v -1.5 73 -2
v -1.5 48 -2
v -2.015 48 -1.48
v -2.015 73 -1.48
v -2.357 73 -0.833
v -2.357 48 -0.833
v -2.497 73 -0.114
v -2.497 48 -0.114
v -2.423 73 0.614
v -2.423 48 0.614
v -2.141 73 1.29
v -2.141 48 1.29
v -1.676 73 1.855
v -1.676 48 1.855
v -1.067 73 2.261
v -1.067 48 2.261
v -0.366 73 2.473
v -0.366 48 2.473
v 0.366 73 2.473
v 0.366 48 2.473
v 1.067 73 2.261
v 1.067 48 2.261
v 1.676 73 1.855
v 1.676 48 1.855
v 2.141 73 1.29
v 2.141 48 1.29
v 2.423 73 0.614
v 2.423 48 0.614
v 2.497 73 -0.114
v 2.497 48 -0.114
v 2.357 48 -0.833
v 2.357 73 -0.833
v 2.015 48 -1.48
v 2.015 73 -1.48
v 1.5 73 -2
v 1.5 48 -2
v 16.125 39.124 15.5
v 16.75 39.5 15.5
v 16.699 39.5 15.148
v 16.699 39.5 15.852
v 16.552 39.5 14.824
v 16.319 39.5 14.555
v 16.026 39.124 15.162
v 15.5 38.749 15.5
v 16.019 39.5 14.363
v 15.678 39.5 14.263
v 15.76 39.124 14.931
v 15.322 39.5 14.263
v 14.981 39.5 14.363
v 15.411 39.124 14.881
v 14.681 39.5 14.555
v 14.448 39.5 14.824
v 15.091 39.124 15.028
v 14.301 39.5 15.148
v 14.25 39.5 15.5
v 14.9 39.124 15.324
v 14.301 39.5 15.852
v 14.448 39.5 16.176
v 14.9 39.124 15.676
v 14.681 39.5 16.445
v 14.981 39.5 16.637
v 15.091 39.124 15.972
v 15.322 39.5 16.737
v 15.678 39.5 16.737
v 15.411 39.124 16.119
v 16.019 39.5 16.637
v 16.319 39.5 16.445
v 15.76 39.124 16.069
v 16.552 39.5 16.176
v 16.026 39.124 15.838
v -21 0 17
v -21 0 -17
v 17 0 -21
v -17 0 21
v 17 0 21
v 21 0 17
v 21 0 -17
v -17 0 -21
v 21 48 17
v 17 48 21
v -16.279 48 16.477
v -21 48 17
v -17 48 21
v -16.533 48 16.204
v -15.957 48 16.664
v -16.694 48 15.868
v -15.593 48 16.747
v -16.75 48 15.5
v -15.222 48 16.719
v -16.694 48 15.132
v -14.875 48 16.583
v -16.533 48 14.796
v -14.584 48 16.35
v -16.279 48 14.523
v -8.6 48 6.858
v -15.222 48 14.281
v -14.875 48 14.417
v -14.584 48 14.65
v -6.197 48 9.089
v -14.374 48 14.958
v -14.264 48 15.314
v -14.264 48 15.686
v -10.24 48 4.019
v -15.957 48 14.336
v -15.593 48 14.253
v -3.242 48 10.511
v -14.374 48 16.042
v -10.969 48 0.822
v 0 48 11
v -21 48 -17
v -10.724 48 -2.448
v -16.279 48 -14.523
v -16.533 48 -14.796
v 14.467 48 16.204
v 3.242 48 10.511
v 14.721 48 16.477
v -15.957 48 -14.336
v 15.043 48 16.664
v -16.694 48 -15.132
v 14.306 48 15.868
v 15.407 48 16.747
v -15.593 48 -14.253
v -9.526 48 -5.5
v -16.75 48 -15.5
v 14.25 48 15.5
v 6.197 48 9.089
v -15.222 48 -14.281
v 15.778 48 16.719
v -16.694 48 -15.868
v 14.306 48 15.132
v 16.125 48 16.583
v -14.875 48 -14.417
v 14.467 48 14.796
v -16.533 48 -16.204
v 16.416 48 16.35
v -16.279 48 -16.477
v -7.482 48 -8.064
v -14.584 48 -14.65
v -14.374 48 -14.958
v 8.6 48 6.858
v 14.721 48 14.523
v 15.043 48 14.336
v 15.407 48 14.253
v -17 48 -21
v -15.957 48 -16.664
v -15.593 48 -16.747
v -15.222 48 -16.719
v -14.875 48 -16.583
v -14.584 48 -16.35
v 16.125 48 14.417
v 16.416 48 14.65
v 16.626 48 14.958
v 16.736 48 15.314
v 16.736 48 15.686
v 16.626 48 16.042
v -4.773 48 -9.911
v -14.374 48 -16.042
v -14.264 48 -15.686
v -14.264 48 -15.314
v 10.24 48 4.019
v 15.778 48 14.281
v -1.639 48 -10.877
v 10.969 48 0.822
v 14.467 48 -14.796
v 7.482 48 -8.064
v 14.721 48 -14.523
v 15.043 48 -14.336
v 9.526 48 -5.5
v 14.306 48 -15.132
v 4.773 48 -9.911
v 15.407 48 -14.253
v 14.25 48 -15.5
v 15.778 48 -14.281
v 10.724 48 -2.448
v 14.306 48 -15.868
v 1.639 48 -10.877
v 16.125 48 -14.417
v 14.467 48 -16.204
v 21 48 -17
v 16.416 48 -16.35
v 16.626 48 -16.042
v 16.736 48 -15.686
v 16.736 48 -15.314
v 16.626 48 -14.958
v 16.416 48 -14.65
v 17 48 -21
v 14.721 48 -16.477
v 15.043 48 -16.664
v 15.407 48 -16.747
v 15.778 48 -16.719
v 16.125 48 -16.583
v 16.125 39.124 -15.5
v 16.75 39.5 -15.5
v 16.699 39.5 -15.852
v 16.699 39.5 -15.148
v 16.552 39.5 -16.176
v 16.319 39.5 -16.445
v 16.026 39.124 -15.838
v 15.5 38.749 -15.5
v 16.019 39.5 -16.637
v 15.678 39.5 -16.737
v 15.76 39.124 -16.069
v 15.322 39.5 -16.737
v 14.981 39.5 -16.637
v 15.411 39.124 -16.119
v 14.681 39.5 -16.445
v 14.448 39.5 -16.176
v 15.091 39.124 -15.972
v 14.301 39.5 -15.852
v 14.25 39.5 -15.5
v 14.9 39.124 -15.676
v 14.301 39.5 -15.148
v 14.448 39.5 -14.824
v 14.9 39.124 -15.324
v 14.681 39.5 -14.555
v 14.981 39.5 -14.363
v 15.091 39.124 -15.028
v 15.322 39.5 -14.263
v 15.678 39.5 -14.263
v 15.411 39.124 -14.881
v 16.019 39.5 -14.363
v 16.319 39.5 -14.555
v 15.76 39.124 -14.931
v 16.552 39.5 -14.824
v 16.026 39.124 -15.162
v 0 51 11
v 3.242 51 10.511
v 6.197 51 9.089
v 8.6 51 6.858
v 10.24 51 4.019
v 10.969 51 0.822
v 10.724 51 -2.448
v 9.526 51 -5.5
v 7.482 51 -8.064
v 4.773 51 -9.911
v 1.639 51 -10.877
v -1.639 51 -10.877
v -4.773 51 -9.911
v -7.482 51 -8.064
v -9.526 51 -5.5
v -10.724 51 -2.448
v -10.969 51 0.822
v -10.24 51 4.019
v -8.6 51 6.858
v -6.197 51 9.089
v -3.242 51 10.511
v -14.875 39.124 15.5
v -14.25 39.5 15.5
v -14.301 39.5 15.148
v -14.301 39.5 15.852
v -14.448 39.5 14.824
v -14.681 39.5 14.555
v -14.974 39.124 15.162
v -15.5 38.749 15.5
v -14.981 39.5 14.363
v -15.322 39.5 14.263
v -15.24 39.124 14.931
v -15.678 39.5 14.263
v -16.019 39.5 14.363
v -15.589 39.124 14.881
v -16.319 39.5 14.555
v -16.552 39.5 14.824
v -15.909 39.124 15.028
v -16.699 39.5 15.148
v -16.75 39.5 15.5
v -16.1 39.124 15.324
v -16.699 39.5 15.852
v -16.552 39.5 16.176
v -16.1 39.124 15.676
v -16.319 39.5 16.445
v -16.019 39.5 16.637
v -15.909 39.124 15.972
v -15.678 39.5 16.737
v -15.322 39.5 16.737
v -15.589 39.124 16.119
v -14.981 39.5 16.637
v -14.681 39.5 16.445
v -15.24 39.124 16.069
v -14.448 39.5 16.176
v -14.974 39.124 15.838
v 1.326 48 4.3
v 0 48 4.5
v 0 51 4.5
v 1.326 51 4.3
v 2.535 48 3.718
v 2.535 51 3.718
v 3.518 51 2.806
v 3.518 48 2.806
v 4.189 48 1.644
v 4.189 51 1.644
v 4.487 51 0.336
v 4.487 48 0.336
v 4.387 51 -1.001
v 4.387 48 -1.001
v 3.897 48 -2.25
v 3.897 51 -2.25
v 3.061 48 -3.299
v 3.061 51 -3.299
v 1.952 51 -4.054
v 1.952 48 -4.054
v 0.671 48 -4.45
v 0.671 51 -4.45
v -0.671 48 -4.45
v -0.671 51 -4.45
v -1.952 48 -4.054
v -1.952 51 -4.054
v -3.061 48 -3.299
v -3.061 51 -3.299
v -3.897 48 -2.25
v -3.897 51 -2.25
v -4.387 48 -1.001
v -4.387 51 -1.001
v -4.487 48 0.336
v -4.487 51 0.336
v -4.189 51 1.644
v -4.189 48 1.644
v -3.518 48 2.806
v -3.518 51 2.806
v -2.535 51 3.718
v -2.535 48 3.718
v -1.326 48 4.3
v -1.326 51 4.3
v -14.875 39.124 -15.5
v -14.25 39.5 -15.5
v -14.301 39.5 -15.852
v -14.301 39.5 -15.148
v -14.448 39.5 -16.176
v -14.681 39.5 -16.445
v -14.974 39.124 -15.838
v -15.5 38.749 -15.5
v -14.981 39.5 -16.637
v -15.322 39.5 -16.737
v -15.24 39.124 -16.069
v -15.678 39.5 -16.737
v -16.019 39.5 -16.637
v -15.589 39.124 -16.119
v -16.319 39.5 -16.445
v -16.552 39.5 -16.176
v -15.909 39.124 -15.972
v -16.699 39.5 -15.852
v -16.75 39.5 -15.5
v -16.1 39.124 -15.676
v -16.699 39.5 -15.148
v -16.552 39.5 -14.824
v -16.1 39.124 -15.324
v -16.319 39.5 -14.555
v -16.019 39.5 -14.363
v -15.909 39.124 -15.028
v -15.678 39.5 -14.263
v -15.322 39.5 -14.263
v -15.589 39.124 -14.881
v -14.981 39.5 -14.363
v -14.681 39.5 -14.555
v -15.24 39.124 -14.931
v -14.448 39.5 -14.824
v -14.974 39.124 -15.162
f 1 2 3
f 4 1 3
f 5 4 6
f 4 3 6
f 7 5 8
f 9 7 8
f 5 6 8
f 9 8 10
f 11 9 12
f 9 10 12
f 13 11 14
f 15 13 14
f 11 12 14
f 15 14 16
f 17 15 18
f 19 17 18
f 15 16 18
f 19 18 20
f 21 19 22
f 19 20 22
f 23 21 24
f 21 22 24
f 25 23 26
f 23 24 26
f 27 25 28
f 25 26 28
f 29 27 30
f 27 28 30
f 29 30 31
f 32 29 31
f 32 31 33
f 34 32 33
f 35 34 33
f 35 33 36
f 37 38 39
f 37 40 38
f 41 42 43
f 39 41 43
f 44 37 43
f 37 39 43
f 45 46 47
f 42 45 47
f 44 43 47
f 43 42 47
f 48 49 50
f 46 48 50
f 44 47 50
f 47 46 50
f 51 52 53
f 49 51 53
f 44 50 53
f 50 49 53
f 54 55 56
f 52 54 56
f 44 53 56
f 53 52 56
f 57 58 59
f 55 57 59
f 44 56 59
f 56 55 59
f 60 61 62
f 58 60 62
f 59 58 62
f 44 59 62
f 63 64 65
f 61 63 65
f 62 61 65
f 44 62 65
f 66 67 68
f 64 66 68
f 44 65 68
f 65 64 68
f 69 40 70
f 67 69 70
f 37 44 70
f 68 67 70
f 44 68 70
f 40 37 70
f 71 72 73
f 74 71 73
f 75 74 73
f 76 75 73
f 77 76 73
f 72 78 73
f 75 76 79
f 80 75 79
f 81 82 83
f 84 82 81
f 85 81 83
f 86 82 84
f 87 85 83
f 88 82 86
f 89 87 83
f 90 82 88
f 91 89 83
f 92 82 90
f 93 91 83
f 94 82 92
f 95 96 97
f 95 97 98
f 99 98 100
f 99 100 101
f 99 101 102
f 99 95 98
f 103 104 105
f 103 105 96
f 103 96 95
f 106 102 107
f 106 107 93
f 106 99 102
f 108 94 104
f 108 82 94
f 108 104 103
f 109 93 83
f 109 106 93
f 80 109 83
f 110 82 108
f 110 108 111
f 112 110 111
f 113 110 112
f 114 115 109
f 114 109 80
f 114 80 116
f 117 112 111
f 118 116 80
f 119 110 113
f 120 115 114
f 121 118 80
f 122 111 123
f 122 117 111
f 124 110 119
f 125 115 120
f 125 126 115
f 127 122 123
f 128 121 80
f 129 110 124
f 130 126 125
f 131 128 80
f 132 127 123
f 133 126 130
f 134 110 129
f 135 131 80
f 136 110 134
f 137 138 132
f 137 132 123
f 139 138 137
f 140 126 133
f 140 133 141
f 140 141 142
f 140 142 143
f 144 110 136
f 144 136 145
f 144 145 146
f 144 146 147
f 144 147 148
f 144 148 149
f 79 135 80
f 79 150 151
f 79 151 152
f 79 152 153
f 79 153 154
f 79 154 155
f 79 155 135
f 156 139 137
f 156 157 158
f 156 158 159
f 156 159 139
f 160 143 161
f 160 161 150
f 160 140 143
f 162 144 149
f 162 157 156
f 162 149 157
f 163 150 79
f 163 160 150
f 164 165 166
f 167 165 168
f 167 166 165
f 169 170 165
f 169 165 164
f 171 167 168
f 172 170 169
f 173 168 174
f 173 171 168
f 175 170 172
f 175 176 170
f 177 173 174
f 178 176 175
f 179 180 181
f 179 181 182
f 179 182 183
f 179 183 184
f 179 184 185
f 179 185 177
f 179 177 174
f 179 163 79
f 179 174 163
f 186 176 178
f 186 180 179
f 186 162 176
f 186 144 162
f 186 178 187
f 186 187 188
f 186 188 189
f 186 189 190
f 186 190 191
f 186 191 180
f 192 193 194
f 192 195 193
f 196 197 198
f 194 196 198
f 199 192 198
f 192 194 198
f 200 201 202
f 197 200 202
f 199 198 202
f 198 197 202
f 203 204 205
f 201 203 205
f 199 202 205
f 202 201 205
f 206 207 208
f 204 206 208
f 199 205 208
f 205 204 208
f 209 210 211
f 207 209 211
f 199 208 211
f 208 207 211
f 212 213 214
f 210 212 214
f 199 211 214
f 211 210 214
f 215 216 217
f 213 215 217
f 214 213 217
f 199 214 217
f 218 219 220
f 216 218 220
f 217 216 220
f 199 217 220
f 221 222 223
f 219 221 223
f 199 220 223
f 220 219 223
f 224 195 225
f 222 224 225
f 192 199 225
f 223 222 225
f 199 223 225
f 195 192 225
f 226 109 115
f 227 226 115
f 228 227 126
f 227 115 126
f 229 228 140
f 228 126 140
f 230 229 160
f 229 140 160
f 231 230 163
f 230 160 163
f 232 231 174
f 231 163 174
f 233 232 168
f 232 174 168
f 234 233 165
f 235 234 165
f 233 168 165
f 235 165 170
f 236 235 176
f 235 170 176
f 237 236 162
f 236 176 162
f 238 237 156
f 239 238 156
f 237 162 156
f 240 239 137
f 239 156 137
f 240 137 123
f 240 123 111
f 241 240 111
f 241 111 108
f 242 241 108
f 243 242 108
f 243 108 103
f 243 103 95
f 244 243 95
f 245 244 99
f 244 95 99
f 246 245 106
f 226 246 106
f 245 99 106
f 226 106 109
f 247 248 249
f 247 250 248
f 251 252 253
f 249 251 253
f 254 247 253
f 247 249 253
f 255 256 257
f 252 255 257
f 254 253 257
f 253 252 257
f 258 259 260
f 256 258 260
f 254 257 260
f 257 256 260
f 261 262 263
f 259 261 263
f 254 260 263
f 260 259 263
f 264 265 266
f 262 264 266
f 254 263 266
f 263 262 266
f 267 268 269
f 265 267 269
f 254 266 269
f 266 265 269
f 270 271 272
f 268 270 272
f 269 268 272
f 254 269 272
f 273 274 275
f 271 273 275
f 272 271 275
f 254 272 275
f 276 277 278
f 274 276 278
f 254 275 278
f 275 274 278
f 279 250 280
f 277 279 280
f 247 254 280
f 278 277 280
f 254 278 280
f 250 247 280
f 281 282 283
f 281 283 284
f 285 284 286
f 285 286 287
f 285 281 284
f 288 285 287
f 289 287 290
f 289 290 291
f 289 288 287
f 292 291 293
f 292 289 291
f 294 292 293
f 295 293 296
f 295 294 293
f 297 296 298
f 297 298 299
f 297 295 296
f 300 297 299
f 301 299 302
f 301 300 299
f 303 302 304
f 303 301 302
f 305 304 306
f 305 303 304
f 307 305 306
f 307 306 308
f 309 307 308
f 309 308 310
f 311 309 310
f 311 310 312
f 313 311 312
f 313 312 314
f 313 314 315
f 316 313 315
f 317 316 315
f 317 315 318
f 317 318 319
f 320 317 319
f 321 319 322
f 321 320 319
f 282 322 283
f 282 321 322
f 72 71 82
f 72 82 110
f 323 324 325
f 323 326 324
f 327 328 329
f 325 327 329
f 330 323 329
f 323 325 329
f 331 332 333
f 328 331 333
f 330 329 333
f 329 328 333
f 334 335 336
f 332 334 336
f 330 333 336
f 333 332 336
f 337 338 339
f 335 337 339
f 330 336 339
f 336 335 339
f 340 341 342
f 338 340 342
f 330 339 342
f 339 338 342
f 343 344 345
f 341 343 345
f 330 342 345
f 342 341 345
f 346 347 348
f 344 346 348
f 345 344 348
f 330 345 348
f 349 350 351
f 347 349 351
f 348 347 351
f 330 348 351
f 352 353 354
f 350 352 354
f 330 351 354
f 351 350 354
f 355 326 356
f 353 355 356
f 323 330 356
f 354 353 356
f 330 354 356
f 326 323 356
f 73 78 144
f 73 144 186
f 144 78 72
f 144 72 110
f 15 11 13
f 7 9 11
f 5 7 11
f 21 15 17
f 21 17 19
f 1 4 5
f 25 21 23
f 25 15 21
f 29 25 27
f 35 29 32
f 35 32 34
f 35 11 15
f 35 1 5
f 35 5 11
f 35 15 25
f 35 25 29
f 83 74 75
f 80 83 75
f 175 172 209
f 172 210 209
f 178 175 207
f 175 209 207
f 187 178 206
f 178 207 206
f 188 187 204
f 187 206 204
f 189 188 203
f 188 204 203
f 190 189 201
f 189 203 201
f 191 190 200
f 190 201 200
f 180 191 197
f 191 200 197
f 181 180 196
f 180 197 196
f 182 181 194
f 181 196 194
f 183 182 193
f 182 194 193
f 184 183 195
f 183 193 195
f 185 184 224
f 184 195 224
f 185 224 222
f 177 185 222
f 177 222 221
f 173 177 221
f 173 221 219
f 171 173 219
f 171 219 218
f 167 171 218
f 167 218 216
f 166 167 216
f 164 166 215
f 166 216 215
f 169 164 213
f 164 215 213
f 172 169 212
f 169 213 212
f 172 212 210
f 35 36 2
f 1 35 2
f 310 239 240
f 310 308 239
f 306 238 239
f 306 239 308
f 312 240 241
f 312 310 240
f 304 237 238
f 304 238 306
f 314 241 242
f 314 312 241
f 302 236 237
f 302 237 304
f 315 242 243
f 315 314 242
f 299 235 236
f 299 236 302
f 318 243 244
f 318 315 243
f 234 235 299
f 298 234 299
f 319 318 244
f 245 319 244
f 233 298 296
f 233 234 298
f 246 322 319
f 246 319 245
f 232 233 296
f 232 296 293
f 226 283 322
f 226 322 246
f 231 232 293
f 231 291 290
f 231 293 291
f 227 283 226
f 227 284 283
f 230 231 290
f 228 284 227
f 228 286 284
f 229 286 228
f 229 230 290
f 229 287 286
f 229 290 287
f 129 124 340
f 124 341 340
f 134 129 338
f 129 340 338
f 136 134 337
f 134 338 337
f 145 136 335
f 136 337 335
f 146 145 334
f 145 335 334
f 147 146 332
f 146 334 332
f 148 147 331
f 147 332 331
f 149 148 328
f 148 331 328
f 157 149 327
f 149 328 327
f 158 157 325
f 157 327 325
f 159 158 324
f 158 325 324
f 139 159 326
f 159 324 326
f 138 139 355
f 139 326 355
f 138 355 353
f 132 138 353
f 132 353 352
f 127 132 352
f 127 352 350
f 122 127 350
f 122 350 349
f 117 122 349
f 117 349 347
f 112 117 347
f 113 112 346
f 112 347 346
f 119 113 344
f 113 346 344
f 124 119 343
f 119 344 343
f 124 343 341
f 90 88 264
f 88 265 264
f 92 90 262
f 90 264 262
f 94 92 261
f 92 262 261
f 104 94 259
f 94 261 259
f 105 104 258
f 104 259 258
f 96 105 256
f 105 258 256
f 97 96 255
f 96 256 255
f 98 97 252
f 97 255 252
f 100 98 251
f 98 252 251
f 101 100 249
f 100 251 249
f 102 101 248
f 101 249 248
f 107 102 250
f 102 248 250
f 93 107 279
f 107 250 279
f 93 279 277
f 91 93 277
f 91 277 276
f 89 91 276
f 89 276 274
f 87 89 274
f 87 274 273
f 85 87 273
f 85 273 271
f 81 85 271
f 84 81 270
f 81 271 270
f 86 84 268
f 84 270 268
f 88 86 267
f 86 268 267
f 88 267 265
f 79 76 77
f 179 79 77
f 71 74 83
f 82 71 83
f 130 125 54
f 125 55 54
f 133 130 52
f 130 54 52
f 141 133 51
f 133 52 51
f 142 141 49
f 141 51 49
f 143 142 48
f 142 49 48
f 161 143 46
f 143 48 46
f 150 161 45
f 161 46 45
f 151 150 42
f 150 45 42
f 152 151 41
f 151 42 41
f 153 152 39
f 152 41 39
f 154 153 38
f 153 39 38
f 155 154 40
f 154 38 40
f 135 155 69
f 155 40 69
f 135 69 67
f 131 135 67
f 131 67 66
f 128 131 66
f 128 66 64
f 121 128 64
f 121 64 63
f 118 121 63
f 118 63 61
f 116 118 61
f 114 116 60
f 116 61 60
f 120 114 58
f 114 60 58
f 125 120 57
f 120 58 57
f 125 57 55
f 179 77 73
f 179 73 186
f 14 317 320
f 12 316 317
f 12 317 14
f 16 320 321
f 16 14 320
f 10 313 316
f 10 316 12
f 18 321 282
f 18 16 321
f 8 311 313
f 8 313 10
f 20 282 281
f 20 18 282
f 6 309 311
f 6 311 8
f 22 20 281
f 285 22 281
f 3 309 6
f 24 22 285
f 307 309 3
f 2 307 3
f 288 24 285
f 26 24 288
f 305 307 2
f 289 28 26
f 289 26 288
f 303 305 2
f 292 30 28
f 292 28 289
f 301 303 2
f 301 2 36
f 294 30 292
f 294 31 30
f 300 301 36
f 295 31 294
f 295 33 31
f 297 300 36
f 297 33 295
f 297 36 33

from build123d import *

# Parameters (mm, degrees)
CROQUIS1_W                = 42
CROQUIS1_H                = 42
SALIENTE_EXTRUIR1_DEPTH   = 48
CROQUIS2_R                = 11
CROQUIS2_R_2              = 4.5
SALIENTE_EXTRUIR2_DEPTH   = 3
SALIENTE_EXTRUIR3_DEPTH   = 25
TALADRO_ROSCADO_M31_D     = 2.5
TALADRO_ROSCADO_M31_DEPTH = 8.5
TALADRO_ROSCADO_M31_TIP   = 0.751075774
CHAFL_N1_SIZE             = 4


with BuildPart() as part:
    # Croquis1 → Saliente-Extruir1 (new body)
    with BuildSketch(Plane(origin=(0, 0, 0), x_dir=(1, 0, 0), z_dir=(0, 1, 0))):
        Rectangle(CROQUIS1_W, CROQUIS1_H)
    extrude(amount=SALIENTE_EXTRUIR1_DEPTH)

    # Croquis2 → Saliente-Extruir2 (add)
    with BuildSketch(Plane(origin=(0, 48, 0), x_dir=(1, 0, 0), z_dir=(0, 1, 0))):
        with Locations(Location((0, 0, 0), (0, 0, 270))):
            Circle(CROQUIS2_R)
        with Locations(Location((0, 0, 0), (0, 0, 270))):
            Circle(CROQUIS2_R_2, mode=Mode.SUBTRACT)
    extrude(amount=SALIENTE_EXTRUIR2_DEPTH)

    # Croquis3 → Saliente-Extruir3 (add)
    with BuildSketch(Plane(origin=(0, 48, 0), x_dir=(1, 0, 0), z_dir=(0, 1, 0))):
        with BuildLine():
            Line((1.5, 2), (-1.5, 2))
            ThreePointArc((-1.5, 2), (0, -2.5), (1.5, 2))
        make_face()
    extrude(amount=SALIENTE_EXTRUIR3_DEPTH)

    # Taladro roscado M31
    with Locations(Plane(origin=(0, 48, 0), x_dir=(1, 0, 0), z_dir=(0, 1, 0))):
        with Locations((-15.5, 15.5), (-15.5, -15.5), (15.5, -15.5), (15.5, 15.5)):
            Hole(TALADRO_ROSCADO_M31_D / 2, depth=TALADRO_ROSCADO_M31_DEPTH)
            with Locations((0, 0, -(TALADRO_ROSCADO_M31_DEPTH + TALADRO_ROSCADO_M31_TIP / 2))):  # 118° drill point
                Cone(0, TALADRO_ROSCADO_M31_D / 2, TALADRO_ROSCADO_M31_TIP, mode=Mode.SUBTRACT)

    # Chaflán1
    chafl_n1_edges = [part.edges().sort_by_distance(p)[0] for p in [
        (-21, 24, -21),
        (21, 24, -21),
        (21, 24, 21),
        (-21, 24, 21),
    ]]
    chamfer(chafl_n1_edges, length=CHAFL_N1_SIZE)


solid = part.part
